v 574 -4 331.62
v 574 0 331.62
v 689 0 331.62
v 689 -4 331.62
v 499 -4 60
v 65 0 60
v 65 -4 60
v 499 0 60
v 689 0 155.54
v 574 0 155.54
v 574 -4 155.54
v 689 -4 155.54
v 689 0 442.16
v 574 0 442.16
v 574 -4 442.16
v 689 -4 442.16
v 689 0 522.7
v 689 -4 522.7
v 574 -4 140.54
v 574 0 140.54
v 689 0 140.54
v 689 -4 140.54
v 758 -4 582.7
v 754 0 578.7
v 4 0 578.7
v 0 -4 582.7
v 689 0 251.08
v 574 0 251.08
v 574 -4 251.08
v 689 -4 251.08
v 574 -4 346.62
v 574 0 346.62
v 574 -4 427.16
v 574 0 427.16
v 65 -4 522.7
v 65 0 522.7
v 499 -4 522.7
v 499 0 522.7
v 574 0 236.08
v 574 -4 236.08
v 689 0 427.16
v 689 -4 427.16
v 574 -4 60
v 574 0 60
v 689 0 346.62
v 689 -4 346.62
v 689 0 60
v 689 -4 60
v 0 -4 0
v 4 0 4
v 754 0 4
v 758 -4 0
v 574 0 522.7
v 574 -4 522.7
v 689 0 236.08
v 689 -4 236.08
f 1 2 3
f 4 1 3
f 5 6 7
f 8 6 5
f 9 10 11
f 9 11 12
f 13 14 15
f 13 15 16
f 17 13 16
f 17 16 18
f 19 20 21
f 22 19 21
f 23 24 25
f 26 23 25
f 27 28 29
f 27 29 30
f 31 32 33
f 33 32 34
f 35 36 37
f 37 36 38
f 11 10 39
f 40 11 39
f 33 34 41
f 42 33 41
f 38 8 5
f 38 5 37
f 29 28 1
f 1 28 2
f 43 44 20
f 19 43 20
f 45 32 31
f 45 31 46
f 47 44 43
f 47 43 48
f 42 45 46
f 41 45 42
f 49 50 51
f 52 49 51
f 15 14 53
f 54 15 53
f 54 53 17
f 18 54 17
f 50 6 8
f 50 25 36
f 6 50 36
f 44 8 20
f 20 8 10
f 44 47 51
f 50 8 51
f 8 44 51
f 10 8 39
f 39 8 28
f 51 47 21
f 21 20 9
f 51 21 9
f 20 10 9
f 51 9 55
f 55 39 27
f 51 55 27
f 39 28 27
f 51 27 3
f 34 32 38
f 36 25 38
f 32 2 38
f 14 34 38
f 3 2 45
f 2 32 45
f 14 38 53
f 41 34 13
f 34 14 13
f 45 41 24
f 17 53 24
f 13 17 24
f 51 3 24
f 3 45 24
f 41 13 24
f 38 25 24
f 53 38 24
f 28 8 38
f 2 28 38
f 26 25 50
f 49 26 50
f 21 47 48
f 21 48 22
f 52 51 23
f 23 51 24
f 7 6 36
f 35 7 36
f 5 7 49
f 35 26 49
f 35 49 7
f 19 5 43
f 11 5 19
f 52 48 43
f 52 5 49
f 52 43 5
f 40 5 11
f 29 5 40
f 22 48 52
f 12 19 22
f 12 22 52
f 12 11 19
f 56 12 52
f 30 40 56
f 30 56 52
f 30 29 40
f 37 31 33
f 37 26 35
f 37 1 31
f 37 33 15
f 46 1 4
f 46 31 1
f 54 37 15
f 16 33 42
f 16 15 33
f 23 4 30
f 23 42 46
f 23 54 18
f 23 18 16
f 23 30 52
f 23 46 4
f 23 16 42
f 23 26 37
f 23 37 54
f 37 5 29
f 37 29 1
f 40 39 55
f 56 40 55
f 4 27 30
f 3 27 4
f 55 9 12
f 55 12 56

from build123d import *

# Parameters (mm, degrees)
F0_W     = 115
F0_H     = 80.54
F0_W_2   = 434
F0_H_2   = 462.7
F1_DEPTH = 4
F2_SIZE  = 3.99999


# Not quite as in the source:
# - a fillet or chamfer is up to 0.001 mm smaller than in the source, because OpenCascade refuses the exact size


with BuildPart() as f1:
    # F0 (on Front) → F1 (new body)
    with BuildSketch(Plane.XZ):
        Polygon((0, 582.7), (0, 0), (509, 0), (559, 0), (758, 0), (758, 582.7), (559, 582.7), (509, 582.7), align=None)
        with Locations((631.5, 100.27)):
            Rectangle(F0_W, F0_H, mode=Mode.SUBTRACT)
        with Locations((631.5, 195.81)):
            Rectangle(F0_W, F0_H, mode=Mode.SUBTRACT)
        with Locations((282, 291.35)):
            Rectangle(F0_W_2, F0_H_2, mode=Mode.SUBTRACT)
        with Locations((631.5, 291.35)):
            Rectangle(F0_W, F0_H, mode=Mode.SUBTRACT)
        with Locations((631.5, 386.89)):
            Rectangle(F0_W, F0_H, mode=Mode.SUBTRACT)
        with Locations((631.5, 482.43)):
            Rectangle(F0_W, F0_H, mode=Mode.SUBTRACT)
    extrude(amount=F1_DEPTH)

    # F2 (size 4 in the source; OpenCascade refuses exactly that, so slightly less here)
    f2_edges = [f1.edges().sort_by_distance(p)[0] for p in [
        (379, 0, 0),
        (758, 0, 291.35),
        (0, 0, 291.35),
        (379, 0, 582.7),
    ]]
    chamfer(f2_edges, length=F2_SIZE)


solid = f1.part
